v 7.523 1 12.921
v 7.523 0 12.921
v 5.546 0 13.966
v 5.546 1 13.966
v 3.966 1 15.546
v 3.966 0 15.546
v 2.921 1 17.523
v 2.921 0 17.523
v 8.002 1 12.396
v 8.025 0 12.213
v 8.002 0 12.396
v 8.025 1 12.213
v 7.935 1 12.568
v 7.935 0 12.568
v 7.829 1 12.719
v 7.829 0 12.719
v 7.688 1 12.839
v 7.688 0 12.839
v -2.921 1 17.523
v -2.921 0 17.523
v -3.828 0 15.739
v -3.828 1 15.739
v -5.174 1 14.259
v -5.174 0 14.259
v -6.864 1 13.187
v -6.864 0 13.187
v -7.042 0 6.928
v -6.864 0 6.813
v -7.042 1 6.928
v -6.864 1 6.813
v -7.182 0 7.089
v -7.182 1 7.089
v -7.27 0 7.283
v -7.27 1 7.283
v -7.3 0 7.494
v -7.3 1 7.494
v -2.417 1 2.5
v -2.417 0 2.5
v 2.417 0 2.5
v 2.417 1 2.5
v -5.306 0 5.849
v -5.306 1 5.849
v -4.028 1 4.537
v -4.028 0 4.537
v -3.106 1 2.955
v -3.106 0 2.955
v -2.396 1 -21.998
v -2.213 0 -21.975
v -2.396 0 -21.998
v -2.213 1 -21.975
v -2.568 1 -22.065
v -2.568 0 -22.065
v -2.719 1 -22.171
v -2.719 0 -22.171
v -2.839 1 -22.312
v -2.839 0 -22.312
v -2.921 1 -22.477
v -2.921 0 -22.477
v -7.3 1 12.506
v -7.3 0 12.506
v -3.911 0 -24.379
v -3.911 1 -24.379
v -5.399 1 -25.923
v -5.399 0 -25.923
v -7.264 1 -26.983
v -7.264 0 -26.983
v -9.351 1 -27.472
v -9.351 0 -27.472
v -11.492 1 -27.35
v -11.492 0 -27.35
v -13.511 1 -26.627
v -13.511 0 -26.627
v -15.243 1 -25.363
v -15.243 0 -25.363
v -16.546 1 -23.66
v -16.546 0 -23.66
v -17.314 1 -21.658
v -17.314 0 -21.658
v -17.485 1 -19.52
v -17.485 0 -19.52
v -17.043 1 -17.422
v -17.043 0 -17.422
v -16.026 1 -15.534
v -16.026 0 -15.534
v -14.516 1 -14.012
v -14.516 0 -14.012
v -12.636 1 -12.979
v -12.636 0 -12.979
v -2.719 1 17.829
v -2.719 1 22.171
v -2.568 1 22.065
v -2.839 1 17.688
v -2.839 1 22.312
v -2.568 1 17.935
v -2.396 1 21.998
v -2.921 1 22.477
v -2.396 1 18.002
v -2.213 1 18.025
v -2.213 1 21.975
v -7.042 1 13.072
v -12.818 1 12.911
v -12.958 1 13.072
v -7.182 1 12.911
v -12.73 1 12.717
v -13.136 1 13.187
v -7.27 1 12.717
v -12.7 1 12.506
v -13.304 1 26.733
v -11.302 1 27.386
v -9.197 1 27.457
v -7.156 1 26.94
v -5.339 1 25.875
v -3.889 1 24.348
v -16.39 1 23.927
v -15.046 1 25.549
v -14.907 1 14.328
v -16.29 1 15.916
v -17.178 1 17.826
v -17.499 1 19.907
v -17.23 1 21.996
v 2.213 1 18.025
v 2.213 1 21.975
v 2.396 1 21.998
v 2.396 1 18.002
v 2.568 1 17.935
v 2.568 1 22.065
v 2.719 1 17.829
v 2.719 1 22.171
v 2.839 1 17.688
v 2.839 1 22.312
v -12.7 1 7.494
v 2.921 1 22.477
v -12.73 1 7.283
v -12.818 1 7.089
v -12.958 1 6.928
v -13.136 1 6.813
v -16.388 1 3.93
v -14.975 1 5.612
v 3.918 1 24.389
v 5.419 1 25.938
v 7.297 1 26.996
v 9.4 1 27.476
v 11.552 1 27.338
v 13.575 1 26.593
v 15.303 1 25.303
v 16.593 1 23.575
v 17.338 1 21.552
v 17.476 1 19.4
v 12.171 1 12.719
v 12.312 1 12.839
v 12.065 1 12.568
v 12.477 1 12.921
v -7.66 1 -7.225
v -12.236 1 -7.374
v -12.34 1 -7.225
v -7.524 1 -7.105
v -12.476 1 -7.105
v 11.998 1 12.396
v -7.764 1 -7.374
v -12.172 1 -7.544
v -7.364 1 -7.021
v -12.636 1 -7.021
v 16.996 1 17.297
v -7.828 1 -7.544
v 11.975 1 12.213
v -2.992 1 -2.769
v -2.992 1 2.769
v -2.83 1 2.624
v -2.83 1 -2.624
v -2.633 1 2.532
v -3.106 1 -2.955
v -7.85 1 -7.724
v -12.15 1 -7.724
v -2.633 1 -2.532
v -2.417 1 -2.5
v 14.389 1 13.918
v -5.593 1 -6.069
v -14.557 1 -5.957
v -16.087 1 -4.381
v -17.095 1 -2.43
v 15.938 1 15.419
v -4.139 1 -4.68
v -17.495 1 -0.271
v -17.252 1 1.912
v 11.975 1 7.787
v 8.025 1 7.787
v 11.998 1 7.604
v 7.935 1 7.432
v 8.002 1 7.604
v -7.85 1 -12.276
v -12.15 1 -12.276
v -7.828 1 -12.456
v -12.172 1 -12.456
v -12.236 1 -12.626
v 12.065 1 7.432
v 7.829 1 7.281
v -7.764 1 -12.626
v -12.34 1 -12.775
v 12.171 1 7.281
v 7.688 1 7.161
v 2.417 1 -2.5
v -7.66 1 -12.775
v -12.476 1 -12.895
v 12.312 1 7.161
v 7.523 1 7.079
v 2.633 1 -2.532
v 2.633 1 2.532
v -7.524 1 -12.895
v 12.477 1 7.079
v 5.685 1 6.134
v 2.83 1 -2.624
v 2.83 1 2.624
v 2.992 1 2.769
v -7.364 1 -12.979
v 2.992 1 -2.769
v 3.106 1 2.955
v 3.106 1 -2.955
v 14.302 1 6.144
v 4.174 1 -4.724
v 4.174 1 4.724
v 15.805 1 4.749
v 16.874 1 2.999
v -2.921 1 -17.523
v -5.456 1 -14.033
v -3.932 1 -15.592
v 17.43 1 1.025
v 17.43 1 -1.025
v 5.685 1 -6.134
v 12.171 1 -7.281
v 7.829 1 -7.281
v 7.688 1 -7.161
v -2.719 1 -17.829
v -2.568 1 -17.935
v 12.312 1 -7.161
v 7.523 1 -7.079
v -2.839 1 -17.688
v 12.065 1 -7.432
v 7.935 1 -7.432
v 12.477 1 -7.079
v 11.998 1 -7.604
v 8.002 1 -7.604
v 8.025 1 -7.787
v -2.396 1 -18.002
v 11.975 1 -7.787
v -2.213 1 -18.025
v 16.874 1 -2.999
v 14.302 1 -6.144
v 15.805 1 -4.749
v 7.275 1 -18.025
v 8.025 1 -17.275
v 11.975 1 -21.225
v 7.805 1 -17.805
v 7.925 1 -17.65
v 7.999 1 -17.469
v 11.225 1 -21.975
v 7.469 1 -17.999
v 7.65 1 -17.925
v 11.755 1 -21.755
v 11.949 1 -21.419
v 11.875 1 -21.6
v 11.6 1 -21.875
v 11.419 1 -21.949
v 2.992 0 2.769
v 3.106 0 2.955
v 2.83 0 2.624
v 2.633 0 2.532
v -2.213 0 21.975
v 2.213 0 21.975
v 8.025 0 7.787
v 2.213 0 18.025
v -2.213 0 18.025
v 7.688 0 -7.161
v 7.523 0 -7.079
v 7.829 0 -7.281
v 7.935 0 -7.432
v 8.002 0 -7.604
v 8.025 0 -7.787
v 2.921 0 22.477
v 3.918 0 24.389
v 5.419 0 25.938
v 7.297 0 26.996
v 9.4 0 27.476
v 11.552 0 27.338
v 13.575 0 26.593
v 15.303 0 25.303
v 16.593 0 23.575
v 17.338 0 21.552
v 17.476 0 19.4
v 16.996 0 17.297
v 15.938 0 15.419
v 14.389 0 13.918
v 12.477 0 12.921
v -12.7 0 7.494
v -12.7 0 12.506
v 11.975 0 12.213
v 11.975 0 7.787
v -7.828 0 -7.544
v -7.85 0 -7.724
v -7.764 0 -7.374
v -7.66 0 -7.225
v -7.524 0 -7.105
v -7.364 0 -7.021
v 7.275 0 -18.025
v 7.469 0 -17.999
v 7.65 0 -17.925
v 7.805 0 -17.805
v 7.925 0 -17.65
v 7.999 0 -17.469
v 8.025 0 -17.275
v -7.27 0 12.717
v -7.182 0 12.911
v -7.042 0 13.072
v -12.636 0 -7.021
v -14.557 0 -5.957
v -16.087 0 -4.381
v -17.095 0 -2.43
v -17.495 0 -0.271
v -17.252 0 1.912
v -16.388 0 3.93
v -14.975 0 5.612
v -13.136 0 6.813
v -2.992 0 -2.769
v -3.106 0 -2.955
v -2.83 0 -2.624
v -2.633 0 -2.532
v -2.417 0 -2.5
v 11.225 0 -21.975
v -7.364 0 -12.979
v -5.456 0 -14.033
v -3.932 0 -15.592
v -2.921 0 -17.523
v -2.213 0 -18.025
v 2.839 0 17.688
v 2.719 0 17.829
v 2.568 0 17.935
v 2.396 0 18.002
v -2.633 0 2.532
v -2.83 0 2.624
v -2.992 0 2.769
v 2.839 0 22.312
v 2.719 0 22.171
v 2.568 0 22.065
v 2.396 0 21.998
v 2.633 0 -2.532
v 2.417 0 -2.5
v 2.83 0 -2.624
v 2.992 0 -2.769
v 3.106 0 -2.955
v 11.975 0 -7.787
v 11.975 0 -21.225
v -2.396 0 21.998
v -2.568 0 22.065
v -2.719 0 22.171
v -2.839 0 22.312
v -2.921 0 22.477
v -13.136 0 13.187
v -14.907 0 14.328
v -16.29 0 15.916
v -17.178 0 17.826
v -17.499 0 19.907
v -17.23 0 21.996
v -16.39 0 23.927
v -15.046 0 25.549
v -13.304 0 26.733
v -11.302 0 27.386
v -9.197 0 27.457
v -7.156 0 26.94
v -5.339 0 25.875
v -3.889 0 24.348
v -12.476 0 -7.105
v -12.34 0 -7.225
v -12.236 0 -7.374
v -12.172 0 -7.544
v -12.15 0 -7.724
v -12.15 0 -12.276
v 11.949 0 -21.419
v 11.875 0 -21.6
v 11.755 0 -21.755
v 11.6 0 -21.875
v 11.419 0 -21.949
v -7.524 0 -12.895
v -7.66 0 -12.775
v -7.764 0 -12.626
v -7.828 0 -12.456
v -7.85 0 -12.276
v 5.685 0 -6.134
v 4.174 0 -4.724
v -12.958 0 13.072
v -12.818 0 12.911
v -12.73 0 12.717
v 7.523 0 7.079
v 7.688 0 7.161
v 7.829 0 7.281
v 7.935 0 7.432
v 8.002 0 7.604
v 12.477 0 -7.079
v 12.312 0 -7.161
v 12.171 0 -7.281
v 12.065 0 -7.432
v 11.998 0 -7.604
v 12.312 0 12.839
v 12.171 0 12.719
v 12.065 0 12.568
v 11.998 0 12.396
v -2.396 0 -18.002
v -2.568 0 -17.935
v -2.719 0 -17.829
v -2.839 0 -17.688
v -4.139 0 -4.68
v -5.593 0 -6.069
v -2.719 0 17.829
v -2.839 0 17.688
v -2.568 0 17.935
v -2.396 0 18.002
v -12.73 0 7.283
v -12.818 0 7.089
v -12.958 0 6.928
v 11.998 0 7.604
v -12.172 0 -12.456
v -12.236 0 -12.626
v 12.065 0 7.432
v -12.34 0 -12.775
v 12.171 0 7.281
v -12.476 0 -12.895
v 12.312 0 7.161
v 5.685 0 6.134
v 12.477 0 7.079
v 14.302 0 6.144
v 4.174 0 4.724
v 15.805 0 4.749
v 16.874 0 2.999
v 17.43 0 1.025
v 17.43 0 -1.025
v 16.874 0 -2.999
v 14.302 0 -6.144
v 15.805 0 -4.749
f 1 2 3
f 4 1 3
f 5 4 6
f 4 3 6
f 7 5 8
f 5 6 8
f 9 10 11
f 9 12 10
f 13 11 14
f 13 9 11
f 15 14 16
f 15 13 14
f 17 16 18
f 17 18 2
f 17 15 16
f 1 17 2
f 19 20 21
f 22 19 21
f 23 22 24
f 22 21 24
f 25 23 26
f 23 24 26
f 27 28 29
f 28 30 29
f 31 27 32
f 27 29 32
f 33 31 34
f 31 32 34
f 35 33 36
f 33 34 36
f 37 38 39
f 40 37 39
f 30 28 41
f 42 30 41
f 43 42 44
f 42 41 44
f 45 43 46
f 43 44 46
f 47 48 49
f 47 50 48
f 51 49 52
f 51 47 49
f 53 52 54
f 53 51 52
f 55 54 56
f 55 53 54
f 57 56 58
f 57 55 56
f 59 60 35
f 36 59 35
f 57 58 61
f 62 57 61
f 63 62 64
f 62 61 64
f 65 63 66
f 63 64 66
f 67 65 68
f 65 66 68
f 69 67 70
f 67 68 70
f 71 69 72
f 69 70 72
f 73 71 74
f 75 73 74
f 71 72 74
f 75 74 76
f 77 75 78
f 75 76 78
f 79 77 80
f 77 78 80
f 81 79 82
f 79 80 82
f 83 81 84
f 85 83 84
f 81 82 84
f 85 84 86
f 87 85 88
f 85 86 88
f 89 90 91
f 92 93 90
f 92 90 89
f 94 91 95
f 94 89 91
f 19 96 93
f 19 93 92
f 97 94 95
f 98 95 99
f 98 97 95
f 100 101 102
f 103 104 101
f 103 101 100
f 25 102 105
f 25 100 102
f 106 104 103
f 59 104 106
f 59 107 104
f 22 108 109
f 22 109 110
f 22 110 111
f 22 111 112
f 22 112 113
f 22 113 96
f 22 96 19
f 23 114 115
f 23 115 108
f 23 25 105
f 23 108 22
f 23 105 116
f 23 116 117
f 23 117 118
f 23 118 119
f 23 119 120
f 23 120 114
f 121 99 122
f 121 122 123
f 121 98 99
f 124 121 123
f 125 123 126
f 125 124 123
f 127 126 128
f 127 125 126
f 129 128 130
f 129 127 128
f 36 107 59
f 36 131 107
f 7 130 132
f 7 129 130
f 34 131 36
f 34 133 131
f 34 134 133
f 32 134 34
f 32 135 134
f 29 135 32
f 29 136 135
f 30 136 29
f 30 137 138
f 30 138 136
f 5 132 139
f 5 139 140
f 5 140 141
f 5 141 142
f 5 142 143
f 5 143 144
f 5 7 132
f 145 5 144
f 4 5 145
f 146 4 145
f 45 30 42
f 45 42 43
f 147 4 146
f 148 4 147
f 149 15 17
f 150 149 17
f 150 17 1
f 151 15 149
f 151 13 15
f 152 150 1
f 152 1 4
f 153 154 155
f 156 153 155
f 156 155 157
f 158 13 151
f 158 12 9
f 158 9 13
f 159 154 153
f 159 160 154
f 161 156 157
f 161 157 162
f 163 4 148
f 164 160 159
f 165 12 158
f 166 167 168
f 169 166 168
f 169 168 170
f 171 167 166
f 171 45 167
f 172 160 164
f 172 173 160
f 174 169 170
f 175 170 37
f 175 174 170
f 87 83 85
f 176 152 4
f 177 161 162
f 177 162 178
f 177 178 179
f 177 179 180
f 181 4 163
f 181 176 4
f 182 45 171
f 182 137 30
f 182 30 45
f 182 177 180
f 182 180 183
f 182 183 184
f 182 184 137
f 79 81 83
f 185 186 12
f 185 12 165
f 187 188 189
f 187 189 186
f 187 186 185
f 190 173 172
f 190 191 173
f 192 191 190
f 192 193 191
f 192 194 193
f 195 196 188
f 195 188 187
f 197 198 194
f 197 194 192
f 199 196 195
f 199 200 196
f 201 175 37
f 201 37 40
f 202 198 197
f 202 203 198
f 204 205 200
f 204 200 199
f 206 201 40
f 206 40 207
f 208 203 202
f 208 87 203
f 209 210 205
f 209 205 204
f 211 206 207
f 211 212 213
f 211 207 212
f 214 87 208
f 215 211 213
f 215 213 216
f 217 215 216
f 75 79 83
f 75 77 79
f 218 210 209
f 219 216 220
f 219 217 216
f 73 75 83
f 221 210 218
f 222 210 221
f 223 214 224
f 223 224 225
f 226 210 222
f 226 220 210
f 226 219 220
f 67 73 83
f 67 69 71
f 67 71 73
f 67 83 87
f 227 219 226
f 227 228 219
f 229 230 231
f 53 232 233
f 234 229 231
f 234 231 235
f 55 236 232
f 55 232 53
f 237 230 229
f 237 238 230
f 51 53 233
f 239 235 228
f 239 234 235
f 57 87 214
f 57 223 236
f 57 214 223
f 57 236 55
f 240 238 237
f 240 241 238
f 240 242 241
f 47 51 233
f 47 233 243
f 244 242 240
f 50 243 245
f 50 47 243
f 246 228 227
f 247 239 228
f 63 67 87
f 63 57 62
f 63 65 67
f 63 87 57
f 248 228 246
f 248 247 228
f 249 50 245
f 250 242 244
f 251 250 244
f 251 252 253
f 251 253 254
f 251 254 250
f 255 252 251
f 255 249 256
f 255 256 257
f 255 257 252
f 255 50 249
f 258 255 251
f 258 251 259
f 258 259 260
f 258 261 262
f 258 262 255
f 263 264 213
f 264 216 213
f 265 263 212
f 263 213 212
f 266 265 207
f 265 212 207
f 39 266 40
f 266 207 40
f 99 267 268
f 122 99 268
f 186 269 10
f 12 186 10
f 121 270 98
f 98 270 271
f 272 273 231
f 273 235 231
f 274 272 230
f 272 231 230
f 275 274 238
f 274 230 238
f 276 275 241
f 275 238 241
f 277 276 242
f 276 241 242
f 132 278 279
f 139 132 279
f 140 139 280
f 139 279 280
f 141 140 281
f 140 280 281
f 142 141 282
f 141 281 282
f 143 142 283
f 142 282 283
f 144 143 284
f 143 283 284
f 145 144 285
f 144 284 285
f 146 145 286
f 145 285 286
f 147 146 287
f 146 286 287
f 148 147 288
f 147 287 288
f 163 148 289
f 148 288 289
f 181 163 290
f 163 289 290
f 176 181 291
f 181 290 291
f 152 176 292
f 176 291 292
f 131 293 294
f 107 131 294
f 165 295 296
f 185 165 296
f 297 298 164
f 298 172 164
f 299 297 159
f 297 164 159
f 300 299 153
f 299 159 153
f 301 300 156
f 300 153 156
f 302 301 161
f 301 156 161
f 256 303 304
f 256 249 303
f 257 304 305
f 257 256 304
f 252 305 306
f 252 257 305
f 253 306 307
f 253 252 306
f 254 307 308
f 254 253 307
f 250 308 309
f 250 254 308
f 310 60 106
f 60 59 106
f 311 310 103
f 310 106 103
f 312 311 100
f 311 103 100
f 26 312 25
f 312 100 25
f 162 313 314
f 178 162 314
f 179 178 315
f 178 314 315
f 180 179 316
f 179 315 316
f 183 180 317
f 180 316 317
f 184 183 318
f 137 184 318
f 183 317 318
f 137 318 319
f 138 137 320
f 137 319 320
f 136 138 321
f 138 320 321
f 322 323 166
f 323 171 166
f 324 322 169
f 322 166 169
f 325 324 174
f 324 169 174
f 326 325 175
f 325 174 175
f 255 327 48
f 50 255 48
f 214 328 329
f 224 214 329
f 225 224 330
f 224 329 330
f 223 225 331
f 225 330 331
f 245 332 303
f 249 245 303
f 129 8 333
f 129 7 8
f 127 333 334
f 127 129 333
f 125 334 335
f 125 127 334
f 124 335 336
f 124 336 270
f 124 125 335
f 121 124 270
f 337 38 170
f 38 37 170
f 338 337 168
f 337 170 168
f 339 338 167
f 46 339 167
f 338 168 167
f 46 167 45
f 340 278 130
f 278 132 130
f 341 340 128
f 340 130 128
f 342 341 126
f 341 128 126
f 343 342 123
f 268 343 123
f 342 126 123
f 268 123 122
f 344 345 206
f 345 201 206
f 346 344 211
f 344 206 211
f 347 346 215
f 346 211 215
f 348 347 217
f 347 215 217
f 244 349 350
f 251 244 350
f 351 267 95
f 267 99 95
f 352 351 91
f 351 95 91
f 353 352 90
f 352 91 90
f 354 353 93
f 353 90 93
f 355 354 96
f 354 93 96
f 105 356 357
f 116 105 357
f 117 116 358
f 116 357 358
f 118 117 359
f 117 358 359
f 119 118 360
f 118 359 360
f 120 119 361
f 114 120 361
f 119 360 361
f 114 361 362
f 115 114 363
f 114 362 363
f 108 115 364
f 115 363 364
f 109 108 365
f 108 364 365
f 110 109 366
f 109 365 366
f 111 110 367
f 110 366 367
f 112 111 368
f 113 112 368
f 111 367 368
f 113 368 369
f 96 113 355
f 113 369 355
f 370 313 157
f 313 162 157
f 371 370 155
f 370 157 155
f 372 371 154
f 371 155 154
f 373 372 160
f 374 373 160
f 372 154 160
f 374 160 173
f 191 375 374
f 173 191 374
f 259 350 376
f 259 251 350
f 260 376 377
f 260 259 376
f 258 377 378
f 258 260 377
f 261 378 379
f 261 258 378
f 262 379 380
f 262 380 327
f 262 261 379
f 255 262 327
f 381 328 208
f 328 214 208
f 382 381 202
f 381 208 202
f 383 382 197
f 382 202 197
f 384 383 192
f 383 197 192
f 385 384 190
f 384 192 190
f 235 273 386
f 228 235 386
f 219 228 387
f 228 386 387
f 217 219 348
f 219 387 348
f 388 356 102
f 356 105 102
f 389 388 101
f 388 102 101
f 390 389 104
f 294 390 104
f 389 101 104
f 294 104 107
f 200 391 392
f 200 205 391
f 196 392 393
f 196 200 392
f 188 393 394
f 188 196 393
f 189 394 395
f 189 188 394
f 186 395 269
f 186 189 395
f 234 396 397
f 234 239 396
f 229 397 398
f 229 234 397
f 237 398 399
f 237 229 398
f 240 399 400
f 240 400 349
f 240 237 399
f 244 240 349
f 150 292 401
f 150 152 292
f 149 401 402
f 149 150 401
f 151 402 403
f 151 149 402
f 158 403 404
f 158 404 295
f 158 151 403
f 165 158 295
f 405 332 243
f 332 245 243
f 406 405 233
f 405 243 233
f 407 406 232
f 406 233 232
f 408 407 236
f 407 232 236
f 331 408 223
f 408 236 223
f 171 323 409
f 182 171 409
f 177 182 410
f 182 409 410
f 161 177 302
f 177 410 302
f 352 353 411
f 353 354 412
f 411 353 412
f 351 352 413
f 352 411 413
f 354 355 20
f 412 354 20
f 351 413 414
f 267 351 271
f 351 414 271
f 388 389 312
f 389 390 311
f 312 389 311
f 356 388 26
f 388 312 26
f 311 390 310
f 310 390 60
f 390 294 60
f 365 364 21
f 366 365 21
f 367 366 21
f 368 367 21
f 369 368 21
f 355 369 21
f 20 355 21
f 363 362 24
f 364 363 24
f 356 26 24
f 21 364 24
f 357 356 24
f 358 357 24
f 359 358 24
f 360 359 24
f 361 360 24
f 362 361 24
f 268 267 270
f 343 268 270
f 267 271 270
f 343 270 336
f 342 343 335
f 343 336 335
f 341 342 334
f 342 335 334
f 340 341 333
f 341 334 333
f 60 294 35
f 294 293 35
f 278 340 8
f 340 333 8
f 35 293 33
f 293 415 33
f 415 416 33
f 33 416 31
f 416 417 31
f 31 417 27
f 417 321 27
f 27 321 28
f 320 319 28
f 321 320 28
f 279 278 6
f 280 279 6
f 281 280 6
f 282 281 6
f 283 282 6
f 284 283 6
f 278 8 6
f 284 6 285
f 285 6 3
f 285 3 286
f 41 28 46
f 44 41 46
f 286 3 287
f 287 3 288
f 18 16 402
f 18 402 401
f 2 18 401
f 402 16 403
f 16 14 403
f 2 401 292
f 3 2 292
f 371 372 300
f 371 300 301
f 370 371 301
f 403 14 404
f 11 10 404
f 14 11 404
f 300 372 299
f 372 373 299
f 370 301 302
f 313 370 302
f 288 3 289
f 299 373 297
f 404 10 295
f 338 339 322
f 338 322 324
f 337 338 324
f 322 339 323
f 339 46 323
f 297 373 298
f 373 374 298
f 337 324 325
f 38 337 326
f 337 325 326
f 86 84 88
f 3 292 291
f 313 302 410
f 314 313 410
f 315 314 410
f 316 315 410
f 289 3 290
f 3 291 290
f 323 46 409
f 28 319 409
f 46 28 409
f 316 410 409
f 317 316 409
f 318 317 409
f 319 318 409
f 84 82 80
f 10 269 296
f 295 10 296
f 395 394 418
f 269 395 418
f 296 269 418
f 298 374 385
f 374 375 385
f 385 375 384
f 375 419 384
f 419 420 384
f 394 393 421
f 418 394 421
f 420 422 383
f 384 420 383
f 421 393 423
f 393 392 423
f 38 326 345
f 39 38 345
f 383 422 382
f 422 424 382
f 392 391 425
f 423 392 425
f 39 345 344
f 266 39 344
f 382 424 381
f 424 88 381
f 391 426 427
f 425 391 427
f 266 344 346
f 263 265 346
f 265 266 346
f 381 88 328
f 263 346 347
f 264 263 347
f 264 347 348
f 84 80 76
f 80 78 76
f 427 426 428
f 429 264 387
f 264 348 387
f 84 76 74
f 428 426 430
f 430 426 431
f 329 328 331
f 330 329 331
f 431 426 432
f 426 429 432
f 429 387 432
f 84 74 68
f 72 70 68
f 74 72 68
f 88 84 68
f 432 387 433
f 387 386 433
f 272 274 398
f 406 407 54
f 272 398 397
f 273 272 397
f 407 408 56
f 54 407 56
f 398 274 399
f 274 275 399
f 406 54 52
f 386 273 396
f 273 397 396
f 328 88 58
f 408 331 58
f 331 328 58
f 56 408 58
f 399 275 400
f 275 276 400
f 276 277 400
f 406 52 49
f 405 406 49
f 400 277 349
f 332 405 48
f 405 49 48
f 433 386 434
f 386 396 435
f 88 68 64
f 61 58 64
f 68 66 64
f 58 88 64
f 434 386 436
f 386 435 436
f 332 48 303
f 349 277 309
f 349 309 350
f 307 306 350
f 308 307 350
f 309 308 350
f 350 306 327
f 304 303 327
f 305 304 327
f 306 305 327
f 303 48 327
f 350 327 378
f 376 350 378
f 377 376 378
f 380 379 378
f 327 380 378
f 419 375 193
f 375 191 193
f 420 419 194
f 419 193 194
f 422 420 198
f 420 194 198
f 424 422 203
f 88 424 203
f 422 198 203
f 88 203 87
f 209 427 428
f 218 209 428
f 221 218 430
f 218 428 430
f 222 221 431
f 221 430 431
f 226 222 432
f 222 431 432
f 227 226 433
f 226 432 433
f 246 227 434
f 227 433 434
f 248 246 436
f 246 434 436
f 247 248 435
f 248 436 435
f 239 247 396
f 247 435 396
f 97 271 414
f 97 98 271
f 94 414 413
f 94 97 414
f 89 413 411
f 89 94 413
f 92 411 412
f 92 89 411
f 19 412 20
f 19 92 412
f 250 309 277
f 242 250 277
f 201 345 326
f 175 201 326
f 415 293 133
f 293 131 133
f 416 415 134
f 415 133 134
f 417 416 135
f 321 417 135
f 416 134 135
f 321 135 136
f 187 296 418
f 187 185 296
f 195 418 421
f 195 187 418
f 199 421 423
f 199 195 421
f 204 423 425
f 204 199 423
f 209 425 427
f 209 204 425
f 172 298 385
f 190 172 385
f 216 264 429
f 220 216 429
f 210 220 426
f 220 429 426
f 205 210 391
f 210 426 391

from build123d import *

# Parameters (mm, degrees)
BOSS_EXTRUDE1_DEPTH = 1
FILLET1_R           = 0.75


with BuildPart() as part:
    # Sketch1 → Boss-Extrude1 (new body)
    with BuildSketch(Plane(origin=(0, 0, 0), x_dir=(1, 0, 0), z_dir=(0, 1, 0))):
        with BuildLine():
            ThreePointArc((2.764713205, -21.975), (15.303300859, -25.303300859), (11.975, -12.764713205))
            Line((11.975, -12.764713205), (11.975, -7.235286795))
            ThreePointArc((11.975, -7.235286795), (17.5, 0), (11.975, 7.235286795))
            Line((11.975, 7.235286795), (11.975, 21.975))
            Line((11.975, 21.975), (-2.764713205, 21.975))
            ThreePointArc((-2.764713205, 21.975), (-15.238556982, 25.367263805), (-12.15, 12.814772098))
            Line((-12.15, 12.814772098), (-12.15, 7.185227902))
            ThreePointArc((-12.15, 7.185227902), (-17.494366614, 0.290635598), (-12.7, -6.997142274))
            Line((-12.7, -6.997142274), (-12.7, -13.002857726))
            ThreePointArc((-12.7, -13.002857726), (-15.02663315, -25.566233841), (-2.764713205, -21.975))
            Line((-2.764713205, -21.975), (2.764713205, -21.975))
        make_face()
        with BuildLine():
            Line((8.025, -7.235286795), (8.025, -12.764713205))
            ThreePointArc((8.025, -12.764713205), (4.696699141, -14.696699141), (2.764713205, -18.025))
            Line((2.764713205, -18.025), (-2.764713205, -18.025))
            ThreePointArc((-2.764713205, -18.025), (-4.433766159, -14.97336685), (-7.3, -13.002857726))
            Line((-7.3, -13.002857726), (-7.3, -6.997142274))
            ThreePointArc((-7.3, -6.997142274), (-4.621848486, -5.22737853), (-2.928932188, -2.5))
            Line((-2.928932188, -2.5), (2.928932188, -2.5))
            ThreePointArc((2.928932188, -2.5), (4.894750646, -5.494217781), (8.025, -7.235286795))
        make_face(mode=Mode.SUBTRACT)
        with BuildLine():
            Line((8.025, 18.025), (8.025, 7.235286795))
            ThreePointArc((8.025, 7.235286795), (4.894750646, 5.494217781), (2.928932188, 2.5))
            Line((2.928932188, 2.5), (-2.928932188, 2.5))
            ThreePointArc((-2.928932188, 2.5), (-4.828456418, 5.431863122), (-7.85, 7.185227902))
            Line((-7.85, 7.185227902), (-7.85, 12.814772098))
            ThreePointArc((-7.85, 12.814772098), (-4.632736195, 14.761443018), (-2.764713205, 18.025))
            Line((-2.764713205, 18.025), (8.025, 18.025))
        make_face(mode=Mode.SUBTRACT)
    extrude(amount=BOSS_EXTRUDE1_DEPTH)

    # Fillet1
    fillet1_edges = [part.edges().sort_by_distance(p)[0] for p in [
        (2.764713205, 0.5, 18.025),
        (-2.764713205, 0.5, 18.025),
        (-2.764713205, 0.5, 21.975),
        (2.764713205, 0.5, 21.975),
        (11.975, 0.5, 12.764713205),
        (11.975, 0.5, 7.235286795),
        (8.025, 0.5, 7.235286795),
        (8.025, 0.5, 12.764713205),
        (-2.928932188, 0.5, 2.5),
        (2.928932188, 0.5, 2.5),
        (2.928932188, 0.5, -2.5),
        (-2.928932188, 0.5, -2.5),
        (11.975, 0.5, -7.235286795),
        (11.975, 0.5, -21.975),
        (-2.764713205, 0.5, -21.975),
        (-2.764713205, 0.5, -18.025),
        (8.025, 0.5, -18.025),
        (8.025, 0.5, -7.235286795),
        (-12.15, 0.5, -12.814772098),
        (-12.15, 0.5, -7.185227902),
        (-7.85, 0.5, -7.185227902),
        (-7.85, 0.5, -12.814772098),
        (-12.7, 0.5, 13.002857726),
        (-12.7, 0.5, 6.997142274),
        (-7.3, 0.5, 6.997142274),
        (-7.3, 0.5, 13.002857726),
    ]]
    fillet(fillet1_edges, radius=FILLET1_R)


solid = part.part
